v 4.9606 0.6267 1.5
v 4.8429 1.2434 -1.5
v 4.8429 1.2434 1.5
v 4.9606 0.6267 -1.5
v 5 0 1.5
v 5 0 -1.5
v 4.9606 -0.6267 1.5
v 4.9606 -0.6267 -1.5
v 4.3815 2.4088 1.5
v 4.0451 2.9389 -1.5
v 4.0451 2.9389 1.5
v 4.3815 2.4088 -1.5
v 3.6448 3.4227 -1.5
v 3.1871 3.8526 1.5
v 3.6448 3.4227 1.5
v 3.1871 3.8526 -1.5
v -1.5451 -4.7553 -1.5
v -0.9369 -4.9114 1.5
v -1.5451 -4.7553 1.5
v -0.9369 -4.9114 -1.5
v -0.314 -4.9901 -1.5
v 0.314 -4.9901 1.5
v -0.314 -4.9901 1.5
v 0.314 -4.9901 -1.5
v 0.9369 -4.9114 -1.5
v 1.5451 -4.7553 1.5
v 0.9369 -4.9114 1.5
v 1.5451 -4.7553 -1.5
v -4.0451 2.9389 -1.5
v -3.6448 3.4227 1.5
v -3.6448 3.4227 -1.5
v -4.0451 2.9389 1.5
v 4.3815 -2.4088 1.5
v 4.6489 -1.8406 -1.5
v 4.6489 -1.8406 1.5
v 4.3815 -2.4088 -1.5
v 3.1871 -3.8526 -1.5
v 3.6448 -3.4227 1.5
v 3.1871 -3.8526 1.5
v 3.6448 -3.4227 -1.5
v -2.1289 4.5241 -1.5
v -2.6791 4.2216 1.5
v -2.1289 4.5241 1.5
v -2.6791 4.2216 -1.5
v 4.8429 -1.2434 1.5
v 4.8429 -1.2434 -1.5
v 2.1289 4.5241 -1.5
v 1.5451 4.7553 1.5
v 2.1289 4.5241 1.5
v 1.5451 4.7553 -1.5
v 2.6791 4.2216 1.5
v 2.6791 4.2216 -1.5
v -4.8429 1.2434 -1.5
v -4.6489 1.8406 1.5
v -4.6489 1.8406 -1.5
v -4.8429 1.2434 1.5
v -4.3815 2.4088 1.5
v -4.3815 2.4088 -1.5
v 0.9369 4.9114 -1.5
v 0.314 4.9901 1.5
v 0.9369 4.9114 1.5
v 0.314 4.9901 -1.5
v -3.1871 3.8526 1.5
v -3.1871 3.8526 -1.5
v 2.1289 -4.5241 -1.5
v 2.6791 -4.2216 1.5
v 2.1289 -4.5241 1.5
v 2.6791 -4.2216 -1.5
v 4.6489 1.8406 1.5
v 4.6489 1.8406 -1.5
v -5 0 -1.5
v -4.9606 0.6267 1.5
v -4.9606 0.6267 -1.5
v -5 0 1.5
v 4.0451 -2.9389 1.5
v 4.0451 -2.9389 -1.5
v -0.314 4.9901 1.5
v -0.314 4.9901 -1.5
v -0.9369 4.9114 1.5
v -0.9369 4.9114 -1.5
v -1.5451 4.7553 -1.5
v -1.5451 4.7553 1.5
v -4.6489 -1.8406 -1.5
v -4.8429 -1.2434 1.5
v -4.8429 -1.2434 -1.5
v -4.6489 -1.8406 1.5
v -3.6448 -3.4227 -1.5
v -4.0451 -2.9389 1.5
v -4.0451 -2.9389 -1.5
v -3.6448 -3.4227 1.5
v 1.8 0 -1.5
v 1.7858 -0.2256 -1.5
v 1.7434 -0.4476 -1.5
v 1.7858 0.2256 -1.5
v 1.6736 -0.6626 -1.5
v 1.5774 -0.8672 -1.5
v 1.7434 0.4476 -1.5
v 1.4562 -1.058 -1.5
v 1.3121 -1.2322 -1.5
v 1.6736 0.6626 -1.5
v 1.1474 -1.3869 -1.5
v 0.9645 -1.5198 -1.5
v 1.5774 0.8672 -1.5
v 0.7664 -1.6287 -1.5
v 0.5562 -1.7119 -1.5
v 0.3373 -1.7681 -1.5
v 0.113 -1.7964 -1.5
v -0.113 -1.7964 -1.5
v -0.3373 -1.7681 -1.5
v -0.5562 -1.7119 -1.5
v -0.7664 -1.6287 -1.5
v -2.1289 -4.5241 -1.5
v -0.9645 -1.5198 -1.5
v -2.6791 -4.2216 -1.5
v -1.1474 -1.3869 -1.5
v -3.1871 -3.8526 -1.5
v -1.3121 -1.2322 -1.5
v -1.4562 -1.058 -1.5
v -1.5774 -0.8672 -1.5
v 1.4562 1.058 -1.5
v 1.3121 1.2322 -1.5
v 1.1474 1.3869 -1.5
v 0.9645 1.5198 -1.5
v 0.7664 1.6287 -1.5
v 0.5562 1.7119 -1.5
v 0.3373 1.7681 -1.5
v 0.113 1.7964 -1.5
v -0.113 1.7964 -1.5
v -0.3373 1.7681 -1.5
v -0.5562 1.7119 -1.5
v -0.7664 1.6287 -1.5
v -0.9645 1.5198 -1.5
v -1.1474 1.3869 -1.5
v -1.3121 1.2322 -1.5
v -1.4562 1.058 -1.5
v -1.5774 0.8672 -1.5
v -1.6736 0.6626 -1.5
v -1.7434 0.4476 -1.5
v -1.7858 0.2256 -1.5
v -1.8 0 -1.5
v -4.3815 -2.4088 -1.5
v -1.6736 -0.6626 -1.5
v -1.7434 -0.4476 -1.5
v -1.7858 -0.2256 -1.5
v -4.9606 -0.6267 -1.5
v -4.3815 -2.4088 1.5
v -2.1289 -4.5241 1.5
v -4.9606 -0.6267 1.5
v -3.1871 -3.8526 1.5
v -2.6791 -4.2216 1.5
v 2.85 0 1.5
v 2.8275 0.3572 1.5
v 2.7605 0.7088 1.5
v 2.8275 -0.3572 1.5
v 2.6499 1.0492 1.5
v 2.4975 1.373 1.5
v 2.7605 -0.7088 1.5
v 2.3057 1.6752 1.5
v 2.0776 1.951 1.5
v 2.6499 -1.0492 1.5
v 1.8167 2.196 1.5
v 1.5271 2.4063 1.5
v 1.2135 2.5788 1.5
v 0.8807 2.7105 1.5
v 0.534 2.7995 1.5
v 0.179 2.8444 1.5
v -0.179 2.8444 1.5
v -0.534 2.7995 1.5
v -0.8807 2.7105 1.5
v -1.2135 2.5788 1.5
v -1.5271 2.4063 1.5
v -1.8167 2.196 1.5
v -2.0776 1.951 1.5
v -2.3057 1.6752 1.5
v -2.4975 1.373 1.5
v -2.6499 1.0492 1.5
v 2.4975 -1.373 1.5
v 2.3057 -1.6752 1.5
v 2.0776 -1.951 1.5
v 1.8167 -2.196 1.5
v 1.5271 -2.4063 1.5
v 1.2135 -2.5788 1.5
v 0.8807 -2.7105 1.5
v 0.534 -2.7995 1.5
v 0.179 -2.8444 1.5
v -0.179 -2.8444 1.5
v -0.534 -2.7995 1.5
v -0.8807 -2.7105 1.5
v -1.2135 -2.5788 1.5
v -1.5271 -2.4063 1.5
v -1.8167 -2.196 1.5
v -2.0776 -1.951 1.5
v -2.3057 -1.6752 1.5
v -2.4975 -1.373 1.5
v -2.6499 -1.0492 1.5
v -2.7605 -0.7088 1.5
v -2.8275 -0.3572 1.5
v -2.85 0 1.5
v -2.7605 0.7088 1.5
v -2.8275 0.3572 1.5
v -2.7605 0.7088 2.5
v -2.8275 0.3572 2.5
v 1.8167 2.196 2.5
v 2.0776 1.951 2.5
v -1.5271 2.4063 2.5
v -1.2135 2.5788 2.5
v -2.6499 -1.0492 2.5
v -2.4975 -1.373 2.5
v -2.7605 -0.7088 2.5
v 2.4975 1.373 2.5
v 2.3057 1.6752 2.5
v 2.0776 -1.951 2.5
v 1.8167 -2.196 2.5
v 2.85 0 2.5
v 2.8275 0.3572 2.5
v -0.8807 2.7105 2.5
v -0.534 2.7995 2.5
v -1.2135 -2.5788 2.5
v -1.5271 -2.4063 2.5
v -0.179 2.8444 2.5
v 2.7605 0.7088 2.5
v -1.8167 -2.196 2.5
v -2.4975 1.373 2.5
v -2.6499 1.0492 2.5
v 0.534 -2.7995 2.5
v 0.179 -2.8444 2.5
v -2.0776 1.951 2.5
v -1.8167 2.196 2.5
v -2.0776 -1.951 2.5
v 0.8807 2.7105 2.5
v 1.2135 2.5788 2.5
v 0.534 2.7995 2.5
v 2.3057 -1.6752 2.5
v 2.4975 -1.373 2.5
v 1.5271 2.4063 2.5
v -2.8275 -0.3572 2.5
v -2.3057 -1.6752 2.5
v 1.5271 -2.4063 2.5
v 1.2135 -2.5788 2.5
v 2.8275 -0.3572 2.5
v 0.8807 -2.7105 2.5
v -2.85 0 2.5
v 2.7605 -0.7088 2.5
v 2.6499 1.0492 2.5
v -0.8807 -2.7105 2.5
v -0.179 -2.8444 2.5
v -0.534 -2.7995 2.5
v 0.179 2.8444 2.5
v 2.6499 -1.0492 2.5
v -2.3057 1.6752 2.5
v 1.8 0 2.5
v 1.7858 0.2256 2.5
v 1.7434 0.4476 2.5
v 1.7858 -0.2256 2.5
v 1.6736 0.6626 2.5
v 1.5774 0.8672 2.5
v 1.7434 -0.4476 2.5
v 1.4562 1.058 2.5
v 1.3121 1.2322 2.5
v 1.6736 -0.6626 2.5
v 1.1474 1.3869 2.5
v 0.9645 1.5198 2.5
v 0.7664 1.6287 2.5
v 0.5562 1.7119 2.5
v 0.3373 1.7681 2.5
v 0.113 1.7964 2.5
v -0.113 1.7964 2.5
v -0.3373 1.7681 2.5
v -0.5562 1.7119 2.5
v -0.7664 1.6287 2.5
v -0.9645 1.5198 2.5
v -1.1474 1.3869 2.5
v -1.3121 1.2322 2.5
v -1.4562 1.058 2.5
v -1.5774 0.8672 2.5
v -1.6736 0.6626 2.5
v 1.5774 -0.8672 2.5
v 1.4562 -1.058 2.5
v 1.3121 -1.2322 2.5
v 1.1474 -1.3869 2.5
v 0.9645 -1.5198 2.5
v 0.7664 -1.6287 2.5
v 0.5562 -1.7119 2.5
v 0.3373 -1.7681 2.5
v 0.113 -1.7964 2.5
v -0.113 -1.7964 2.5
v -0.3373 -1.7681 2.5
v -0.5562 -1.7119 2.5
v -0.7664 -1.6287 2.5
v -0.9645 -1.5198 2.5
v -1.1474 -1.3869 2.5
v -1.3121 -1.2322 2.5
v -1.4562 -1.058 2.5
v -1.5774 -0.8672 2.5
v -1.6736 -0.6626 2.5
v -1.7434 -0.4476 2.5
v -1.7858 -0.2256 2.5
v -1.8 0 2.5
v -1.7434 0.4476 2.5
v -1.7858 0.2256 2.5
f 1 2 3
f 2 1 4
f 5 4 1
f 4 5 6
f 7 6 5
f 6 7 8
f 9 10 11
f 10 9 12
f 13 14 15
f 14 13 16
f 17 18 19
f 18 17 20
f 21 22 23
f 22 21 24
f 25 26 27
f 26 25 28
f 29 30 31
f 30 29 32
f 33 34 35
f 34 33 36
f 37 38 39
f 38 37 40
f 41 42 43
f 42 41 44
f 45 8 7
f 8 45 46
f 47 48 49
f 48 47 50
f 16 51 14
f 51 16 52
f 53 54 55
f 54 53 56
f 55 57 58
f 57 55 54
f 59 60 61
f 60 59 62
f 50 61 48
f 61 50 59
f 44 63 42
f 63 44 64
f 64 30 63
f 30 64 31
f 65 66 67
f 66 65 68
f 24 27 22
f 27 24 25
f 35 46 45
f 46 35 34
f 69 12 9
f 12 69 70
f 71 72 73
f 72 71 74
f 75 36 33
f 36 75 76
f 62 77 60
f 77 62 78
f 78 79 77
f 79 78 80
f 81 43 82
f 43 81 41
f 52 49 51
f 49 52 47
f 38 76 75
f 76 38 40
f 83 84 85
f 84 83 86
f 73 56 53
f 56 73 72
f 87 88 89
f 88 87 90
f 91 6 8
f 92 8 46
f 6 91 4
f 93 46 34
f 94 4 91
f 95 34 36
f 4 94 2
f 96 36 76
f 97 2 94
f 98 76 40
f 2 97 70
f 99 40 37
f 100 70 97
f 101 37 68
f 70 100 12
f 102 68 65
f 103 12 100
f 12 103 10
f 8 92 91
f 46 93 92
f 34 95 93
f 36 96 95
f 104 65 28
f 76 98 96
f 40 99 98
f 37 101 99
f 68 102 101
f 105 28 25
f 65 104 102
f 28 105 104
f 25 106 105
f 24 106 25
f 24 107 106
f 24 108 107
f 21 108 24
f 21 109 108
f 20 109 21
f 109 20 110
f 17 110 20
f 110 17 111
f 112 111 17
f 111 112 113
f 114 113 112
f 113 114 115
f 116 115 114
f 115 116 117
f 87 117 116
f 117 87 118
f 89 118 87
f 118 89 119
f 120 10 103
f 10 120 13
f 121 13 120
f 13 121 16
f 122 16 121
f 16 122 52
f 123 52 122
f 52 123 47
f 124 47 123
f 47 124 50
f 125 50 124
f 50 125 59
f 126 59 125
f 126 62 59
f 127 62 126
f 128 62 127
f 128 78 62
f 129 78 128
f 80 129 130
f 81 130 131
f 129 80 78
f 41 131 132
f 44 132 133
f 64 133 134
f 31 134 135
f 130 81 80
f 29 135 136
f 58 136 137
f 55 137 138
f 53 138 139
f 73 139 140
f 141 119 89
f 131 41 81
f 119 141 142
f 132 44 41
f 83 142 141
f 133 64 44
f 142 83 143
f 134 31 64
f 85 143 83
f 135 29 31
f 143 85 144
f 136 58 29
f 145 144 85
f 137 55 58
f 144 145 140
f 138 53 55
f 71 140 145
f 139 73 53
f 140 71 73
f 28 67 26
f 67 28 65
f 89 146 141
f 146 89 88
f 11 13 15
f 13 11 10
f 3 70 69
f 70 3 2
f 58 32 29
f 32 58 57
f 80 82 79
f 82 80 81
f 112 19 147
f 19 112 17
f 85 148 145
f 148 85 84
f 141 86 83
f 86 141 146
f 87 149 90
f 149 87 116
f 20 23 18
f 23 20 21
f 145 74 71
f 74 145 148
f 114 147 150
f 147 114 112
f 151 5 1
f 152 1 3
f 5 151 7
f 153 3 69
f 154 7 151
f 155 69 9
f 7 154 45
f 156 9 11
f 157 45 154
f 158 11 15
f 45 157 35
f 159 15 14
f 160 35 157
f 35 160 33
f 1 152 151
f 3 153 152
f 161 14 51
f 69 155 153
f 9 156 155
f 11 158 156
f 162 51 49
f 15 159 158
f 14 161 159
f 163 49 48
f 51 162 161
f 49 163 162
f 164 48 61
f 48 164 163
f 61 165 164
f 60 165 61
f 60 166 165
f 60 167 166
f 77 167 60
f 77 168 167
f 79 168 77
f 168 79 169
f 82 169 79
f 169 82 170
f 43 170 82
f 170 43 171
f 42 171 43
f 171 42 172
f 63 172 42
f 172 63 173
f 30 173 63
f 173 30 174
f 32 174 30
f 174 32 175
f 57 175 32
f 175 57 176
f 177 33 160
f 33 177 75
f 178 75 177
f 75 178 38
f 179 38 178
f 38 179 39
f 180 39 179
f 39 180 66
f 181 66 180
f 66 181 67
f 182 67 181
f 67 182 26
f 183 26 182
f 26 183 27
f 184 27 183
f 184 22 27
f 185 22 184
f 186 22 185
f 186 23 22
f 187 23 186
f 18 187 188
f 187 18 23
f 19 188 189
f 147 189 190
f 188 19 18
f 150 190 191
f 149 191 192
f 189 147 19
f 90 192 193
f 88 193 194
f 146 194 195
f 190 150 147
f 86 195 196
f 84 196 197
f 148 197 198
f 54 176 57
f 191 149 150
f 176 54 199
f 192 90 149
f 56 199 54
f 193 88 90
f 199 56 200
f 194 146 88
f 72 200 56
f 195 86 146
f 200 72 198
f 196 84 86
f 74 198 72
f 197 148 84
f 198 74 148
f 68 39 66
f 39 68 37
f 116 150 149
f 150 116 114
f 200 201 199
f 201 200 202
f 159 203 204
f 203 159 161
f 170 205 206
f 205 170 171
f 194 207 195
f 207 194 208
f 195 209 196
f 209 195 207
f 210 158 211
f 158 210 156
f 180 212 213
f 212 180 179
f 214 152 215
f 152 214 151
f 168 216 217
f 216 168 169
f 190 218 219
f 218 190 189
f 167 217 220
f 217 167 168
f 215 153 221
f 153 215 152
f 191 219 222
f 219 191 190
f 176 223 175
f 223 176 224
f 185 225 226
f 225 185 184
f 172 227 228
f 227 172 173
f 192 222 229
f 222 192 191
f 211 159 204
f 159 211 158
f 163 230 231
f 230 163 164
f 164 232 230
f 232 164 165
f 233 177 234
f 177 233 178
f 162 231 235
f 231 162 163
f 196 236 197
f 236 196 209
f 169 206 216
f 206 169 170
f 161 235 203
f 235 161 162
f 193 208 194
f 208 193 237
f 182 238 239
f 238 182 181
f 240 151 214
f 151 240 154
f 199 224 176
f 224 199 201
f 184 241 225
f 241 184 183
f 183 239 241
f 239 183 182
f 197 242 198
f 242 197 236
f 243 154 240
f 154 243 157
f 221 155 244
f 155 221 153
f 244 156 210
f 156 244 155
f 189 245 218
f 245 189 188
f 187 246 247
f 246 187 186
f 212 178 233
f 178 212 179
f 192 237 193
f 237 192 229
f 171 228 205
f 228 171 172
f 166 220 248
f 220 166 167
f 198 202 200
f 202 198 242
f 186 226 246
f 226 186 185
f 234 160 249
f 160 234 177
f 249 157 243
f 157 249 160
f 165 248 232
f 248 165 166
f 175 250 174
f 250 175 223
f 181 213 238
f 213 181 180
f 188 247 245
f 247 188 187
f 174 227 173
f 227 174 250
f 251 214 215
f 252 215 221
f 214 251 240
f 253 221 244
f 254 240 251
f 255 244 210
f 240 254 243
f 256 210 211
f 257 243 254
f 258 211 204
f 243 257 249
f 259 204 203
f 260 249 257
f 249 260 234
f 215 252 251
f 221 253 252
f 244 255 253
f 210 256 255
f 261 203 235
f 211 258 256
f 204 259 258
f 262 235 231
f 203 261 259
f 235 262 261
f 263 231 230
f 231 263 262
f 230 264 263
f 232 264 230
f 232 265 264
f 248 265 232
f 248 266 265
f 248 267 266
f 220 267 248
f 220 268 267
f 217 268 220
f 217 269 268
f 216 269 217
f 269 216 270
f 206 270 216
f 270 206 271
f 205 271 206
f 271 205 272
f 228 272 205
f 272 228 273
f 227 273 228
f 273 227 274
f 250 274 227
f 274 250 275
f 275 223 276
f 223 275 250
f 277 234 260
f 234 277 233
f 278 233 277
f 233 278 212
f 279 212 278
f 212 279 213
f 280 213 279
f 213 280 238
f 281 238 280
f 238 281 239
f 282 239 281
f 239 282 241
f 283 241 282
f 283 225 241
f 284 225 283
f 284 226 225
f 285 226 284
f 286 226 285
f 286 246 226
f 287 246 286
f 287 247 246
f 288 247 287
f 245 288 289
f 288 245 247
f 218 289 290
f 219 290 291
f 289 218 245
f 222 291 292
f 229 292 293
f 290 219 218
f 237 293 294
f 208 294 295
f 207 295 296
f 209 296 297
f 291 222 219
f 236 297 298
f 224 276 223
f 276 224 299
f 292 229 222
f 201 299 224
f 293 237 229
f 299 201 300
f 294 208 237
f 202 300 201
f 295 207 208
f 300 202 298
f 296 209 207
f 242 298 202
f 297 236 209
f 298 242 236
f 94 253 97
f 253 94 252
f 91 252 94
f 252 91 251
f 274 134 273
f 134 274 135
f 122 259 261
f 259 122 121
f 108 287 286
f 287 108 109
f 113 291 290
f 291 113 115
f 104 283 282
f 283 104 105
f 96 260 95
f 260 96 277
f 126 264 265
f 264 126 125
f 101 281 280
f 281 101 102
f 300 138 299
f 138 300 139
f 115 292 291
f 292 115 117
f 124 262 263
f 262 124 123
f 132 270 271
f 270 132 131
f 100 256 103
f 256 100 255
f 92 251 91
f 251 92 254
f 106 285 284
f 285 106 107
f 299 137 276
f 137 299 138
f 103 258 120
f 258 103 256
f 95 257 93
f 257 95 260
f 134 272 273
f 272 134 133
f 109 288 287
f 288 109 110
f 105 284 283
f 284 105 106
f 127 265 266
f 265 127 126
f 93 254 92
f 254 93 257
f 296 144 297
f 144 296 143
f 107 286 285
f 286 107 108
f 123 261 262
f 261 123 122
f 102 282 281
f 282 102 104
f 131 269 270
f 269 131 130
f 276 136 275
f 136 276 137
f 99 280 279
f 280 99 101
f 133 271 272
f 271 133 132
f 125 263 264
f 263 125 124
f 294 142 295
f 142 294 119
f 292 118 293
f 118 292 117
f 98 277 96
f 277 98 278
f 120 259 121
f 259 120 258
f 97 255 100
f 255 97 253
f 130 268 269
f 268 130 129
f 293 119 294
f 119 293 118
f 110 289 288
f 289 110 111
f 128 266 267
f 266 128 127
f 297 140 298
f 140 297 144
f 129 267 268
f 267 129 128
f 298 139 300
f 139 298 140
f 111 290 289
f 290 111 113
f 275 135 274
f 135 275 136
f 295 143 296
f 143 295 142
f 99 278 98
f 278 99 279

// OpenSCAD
$fn = 50;


difference() {
	union() {
		translate(v = [0, 0, -1.5000000000]) {
			rotate(a = [0, 0, 0]) {
				cylinder(h = 3, r = 5.0000000000);
			}
		}
		translate(v = [0, 0, -1.5000000000]) {
			rotate(a = [0, 0, 0]) {
				cylinder(h = 4, r = 2.8500000000);
			}
		}
	}
	union() {
		translate(v = [0, 0, -125.0000000000]) {
			rotate(a = [0, 0, 0]) {
				cylinder(h = 250, r = 1.8000000000);
			}
		}
	}
}
